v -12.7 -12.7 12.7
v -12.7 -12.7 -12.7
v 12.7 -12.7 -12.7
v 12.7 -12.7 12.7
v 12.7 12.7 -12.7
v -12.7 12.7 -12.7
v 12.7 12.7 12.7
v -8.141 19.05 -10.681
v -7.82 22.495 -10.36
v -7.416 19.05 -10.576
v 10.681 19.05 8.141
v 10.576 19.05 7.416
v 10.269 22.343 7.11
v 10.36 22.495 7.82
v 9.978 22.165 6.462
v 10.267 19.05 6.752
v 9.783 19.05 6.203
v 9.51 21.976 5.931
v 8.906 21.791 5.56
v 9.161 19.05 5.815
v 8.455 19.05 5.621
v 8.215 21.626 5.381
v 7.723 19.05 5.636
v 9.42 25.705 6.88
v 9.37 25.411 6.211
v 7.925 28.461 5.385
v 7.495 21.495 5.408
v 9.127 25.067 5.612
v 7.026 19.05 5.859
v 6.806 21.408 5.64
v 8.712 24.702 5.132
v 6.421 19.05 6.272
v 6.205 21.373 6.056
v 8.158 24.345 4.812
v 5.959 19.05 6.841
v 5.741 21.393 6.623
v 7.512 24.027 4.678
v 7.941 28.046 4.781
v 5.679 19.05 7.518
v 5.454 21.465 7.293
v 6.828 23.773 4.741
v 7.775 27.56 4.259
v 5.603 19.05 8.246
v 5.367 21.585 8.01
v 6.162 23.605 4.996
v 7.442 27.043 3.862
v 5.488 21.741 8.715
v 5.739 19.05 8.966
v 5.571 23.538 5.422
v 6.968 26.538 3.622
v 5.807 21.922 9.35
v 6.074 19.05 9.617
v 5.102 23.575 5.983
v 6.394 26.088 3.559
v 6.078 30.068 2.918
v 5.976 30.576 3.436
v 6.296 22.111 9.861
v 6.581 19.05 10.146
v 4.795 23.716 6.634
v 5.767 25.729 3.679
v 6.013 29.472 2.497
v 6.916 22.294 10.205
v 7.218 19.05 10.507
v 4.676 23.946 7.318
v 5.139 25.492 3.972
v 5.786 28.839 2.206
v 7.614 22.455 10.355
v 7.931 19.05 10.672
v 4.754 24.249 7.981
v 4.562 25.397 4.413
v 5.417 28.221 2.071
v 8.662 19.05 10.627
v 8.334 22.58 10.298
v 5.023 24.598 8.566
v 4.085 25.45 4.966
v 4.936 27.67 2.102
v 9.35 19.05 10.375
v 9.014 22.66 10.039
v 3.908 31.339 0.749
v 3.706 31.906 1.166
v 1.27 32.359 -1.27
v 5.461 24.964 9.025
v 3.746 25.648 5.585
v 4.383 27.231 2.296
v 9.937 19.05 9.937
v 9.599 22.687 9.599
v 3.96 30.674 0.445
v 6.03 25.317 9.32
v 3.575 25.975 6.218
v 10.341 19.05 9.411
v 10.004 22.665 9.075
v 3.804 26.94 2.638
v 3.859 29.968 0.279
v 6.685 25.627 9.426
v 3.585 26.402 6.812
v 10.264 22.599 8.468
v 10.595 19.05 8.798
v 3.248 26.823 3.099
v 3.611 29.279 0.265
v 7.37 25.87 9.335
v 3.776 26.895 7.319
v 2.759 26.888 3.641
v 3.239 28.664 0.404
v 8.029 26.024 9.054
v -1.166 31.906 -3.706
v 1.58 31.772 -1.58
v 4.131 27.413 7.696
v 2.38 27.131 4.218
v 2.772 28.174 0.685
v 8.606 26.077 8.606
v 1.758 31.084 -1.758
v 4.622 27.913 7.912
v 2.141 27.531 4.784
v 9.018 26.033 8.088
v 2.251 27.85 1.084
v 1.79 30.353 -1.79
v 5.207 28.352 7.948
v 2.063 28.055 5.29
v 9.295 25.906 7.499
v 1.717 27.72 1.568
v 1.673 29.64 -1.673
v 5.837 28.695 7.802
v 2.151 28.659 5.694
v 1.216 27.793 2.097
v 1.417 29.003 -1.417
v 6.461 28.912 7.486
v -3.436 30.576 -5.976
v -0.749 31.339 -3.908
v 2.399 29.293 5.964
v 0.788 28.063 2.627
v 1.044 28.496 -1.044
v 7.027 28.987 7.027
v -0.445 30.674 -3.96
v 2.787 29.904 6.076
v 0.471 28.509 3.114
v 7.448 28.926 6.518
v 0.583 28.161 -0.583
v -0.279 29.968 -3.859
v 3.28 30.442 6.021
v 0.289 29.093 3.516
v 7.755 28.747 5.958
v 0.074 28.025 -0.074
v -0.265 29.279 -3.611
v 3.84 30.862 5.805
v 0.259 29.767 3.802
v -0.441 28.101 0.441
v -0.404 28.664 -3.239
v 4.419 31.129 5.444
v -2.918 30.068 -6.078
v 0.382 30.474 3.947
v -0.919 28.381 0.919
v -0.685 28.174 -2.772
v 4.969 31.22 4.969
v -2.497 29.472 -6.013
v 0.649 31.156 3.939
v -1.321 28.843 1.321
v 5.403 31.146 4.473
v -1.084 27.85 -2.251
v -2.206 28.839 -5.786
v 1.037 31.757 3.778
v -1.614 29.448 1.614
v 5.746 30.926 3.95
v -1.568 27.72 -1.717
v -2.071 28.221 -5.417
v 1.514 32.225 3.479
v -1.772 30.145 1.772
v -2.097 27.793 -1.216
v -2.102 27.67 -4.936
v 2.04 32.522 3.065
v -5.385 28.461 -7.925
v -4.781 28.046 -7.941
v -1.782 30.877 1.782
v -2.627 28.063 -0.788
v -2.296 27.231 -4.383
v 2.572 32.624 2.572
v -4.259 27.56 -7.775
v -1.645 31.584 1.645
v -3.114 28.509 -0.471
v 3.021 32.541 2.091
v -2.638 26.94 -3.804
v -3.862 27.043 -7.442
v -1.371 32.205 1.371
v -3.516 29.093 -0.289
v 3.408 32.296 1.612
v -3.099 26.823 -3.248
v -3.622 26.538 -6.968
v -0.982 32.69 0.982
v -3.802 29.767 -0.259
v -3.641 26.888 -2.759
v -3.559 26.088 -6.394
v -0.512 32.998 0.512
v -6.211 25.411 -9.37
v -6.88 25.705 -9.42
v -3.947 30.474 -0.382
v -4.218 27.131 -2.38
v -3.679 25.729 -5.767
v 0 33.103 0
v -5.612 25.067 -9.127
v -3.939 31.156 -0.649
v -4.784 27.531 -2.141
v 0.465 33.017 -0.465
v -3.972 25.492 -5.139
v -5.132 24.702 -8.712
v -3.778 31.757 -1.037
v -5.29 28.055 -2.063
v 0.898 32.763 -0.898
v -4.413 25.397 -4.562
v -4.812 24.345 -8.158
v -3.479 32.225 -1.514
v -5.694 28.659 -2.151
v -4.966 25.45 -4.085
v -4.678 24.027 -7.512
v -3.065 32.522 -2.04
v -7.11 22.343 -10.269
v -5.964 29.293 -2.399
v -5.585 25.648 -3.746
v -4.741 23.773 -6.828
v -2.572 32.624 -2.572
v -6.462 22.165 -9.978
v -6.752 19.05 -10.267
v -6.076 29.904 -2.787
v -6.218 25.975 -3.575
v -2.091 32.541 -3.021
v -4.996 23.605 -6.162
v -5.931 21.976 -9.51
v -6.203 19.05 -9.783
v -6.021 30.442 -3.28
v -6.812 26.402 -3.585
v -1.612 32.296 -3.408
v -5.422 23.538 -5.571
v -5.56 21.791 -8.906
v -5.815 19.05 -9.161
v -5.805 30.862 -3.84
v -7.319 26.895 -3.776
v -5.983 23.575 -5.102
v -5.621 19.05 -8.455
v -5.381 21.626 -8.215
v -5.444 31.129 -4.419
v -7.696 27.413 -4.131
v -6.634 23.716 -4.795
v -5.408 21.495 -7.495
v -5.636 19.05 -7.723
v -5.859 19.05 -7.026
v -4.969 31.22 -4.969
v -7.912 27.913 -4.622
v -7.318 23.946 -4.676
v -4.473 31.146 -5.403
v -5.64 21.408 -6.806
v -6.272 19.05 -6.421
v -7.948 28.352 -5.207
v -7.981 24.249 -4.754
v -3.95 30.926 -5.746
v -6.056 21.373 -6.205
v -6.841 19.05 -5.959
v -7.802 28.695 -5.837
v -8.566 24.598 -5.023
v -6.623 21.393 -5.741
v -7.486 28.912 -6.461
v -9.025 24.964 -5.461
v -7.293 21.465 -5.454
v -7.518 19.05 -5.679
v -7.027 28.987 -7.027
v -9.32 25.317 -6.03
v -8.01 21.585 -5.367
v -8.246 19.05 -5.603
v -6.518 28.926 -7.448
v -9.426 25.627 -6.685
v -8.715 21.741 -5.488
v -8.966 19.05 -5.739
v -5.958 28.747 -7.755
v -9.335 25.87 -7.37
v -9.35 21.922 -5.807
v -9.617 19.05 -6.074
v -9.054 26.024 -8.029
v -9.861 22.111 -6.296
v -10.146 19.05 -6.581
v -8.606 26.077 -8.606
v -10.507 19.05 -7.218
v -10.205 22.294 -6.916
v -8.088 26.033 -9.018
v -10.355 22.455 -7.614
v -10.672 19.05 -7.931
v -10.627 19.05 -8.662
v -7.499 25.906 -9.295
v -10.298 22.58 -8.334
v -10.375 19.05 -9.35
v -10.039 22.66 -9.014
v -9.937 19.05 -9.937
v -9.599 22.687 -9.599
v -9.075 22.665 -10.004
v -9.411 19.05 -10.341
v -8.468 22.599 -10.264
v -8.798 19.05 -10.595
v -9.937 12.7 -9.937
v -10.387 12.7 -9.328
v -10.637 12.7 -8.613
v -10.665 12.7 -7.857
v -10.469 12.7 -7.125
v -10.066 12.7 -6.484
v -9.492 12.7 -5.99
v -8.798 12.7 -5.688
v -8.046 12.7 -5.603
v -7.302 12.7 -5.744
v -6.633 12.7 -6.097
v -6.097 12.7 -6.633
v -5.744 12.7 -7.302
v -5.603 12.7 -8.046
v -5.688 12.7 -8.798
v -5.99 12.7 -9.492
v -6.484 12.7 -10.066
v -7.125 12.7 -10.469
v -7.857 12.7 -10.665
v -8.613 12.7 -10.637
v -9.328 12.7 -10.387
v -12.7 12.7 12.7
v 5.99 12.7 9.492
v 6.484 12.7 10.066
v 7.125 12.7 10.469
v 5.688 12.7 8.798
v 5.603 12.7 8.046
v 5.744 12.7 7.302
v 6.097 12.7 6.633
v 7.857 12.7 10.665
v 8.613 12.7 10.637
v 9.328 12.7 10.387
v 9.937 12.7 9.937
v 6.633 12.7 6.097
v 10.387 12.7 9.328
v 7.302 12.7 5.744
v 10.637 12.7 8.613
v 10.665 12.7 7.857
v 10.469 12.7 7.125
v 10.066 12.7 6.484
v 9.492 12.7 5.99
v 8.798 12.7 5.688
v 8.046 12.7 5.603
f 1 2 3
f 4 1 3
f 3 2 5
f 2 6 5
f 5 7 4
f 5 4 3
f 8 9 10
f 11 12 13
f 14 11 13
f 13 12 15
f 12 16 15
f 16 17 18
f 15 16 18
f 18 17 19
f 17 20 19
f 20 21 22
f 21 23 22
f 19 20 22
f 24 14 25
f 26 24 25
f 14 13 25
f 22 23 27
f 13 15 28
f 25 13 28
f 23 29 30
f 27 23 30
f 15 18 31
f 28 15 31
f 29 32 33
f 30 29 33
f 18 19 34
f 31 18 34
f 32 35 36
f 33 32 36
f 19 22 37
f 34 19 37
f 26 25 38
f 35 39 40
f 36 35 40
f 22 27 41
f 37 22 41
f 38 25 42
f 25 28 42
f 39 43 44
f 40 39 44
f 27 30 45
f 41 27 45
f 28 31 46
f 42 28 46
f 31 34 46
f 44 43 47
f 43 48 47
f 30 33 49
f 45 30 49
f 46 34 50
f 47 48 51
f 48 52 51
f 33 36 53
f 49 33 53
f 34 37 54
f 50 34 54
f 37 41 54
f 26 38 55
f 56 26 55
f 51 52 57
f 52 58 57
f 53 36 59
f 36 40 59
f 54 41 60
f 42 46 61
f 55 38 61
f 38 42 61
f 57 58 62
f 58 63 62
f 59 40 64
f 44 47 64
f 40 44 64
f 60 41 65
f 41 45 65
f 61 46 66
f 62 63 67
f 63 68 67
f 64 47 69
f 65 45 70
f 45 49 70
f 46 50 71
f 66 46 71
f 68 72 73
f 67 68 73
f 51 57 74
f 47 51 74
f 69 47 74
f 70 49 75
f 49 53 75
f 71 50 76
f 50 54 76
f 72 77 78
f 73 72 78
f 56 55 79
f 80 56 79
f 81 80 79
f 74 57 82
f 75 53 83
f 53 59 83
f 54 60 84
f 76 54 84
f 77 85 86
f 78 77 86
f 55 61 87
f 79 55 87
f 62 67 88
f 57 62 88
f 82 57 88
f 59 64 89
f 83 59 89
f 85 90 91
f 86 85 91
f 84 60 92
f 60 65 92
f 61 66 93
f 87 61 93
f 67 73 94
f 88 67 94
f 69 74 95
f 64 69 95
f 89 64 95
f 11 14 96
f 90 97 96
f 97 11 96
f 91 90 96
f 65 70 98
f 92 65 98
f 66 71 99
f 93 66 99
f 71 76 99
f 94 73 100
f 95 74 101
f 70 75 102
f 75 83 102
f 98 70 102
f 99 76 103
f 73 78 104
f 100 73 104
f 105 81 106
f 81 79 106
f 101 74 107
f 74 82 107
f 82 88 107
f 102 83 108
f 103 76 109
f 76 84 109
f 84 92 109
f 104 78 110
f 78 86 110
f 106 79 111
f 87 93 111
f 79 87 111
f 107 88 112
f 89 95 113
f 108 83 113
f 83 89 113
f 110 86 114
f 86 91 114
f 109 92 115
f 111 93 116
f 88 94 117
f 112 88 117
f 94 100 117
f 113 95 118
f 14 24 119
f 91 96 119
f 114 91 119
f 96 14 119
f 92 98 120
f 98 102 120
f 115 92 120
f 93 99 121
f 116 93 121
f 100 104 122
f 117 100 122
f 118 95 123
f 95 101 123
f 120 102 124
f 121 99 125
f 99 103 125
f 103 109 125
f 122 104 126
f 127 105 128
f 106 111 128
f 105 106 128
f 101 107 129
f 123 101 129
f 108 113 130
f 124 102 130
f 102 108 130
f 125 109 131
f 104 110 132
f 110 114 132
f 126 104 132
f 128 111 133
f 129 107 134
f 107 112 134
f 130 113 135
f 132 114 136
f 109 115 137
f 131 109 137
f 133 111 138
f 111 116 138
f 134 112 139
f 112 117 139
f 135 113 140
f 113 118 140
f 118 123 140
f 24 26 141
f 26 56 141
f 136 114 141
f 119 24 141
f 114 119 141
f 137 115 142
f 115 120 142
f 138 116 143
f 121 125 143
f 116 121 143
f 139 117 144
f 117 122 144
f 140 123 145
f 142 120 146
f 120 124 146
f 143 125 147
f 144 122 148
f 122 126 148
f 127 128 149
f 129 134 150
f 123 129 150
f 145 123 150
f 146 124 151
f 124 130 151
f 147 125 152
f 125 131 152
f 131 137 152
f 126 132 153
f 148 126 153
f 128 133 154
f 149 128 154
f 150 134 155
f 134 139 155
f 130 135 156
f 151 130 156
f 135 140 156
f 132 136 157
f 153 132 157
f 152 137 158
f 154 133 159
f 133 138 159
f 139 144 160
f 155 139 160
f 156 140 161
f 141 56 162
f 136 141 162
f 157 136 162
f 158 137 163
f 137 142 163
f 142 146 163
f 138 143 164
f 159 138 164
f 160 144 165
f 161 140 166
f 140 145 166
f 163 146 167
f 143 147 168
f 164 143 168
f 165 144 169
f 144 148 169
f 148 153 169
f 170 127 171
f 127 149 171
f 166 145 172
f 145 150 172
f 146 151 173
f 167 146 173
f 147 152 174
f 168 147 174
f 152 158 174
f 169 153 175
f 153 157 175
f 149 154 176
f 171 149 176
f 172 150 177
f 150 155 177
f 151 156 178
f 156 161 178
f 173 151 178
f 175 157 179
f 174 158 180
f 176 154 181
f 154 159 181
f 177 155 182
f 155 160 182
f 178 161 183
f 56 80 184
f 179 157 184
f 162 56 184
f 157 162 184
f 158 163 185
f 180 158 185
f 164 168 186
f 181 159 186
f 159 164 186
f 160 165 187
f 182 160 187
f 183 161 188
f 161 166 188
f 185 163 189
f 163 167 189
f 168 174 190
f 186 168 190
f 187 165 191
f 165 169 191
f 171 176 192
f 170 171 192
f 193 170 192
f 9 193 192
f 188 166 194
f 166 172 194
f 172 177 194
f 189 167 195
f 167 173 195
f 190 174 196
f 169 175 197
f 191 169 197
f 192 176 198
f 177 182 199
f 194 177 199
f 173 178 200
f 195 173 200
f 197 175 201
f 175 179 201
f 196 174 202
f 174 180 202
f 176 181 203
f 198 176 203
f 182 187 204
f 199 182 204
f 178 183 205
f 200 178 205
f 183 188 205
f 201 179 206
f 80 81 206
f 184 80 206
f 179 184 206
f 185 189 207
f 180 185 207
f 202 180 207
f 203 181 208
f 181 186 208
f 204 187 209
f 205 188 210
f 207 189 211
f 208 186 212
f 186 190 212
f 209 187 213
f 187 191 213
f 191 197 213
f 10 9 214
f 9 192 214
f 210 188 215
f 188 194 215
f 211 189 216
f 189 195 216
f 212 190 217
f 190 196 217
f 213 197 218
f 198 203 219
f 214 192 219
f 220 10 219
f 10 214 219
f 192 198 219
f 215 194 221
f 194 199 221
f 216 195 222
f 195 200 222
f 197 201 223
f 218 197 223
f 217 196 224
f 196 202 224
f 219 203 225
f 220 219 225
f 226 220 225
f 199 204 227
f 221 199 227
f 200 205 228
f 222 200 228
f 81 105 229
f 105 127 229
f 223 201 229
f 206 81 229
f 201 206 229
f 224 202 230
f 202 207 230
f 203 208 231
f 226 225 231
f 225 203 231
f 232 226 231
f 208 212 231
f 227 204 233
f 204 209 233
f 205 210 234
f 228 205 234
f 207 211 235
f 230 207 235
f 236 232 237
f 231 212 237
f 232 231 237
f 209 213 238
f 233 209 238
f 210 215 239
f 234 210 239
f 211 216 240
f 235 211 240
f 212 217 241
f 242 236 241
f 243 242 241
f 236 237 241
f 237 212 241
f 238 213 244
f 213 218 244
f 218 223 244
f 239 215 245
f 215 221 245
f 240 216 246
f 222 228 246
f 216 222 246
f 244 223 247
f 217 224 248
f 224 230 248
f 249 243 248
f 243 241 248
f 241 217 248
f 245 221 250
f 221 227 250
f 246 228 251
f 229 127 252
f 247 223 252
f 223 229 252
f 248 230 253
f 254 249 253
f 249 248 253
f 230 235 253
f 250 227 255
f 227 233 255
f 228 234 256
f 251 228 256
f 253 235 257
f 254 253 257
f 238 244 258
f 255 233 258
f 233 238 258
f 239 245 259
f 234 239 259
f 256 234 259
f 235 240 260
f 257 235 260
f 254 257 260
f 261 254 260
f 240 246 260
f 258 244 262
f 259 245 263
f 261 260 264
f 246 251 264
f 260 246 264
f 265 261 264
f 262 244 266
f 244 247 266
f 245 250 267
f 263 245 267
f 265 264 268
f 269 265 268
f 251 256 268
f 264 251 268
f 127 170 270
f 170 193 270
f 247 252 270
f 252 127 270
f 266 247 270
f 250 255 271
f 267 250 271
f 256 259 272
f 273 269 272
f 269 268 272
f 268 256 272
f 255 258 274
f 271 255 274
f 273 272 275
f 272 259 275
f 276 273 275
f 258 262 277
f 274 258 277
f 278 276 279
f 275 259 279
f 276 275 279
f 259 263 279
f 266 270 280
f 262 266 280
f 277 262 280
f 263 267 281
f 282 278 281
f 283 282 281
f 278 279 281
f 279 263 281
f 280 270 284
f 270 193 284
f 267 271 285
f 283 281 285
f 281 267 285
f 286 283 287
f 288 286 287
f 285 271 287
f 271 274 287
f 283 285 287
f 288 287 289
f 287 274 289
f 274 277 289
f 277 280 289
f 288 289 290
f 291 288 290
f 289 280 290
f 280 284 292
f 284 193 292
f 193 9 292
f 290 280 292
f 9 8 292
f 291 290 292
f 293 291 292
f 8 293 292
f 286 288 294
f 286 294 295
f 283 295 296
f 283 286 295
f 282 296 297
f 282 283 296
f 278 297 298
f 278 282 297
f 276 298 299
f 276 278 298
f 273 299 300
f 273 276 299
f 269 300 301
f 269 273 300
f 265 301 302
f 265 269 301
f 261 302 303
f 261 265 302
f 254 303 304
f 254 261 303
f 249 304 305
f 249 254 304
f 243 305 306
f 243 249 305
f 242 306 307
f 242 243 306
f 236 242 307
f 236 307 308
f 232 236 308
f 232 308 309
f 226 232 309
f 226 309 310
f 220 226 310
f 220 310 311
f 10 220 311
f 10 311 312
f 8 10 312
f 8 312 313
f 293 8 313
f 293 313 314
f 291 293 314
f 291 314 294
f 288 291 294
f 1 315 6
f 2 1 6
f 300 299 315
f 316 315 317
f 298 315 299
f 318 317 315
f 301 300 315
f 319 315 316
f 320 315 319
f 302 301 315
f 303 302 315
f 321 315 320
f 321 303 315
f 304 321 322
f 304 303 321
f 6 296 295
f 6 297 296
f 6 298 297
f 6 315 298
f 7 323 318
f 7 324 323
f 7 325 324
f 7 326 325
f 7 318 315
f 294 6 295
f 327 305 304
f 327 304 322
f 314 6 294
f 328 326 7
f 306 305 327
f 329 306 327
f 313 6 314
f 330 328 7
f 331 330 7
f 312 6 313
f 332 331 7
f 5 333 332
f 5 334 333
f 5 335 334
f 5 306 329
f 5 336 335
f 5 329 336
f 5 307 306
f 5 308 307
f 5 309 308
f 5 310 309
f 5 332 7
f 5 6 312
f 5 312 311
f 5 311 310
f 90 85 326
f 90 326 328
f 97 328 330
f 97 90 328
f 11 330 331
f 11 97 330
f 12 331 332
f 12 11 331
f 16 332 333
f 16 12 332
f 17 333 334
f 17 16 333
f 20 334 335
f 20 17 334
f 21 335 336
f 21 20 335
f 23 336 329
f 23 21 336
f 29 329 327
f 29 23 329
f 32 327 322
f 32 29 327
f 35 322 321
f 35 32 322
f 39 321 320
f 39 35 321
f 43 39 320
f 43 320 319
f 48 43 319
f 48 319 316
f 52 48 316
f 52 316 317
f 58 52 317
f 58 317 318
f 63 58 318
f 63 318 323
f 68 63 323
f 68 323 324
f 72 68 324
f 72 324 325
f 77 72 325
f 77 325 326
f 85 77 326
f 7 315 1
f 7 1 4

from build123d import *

# Parameters (mm, degrees)
SKETCH1_W           = 25.4
SKETCH1_H           = 25.4
BOSS_EXTRUDE1_DEPTH = 12.7
SKETCH2_R           = 2.54
REVOLVE1_ANGLE      = 180
BOSS_EXTRUDE2_REACH = 38.478
SKETCH2_3_R         = 2.54


with BuildPart() as part:
    # Sketch1 → Boss-Extrude1 (new, symmetric)
    with BuildSketch(Plane(origin=(0, 0, 0), x_dir=(1, 0, 0), z_dir=(0, 1, 0))):
        Rectangle(SKETCH1_W, SKETCH1_H)
    extrude(amount=BOSS_EXTRUDE1_DEPTH, both=True)

    # Sketch2<3> → Boss-Extrude2 (add, up to next)
    with BuildSketch(Plane(origin=(0, 19.05, 0), x_dir=(1, 0, 0), z_dir=(0, 1, 0)), mode=Mode.PRIVATE) as boss_extrude2_sk1:
        with Locations((8.141095825, -8.141095825)):
            Circle(SKETCH2_3_R)
    boss_extrude2_tool1 = extrude(boss_extrude2_sk1.sketch, amount=-BOSS_EXTRUDE2_REACH, mode=Mode.PRIVATE) - part.part
    # Sketch2<3> → Boss-Extrude2 (add, up to next)
    with BuildSketch(Plane(origin=(0, 19.05, 0), x_dir=(1, 0, 0), z_dir=(0, 1, 0)), mode=Mode.PRIVATE) as boss_extrude2_sk2:
        with Locations((-8.141095825, 8.141095825)):
            Circle(SKETCH2_3_R)
    boss_extrude2_tool2 = extrude(boss_extrude2_sk2.sketch, amount=-BOSS_EXTRUDE2_REACH, mode=Mode.PRIVATE) - part.part


with BuildPart() as body_2:
    # Sketch2 → Revolve1 (revolve)
    with BuildSketch(Plane(origin=(0, 19.05, 0), x_dir=(1, 0, 0), z_dir=(0, 1, 0))):
        with Locations((8.141095825, -8.141095825)):
            Circle(SKETCH2_R)
    revolve(axis=Axis((0, 19.05, 0), (-0.7071067811865464, 0, 0.7071067811865487)), revolution_arc=REVOLVE1_ANGLE)


with BuildPart() as part_1:
    add(part.part)

    add(body_2.part)  # Boss-Extrude2 merges body 2
    add(boss_extrude2_tool1.solids().sort_by_distance((8.141096, 19.05, 8.141096))[0])
    add(boss_extrude2_tool2.solids().sort_by_distance((-8.141096, 19.05, -8.141096))[0])


solid = part_1.part
